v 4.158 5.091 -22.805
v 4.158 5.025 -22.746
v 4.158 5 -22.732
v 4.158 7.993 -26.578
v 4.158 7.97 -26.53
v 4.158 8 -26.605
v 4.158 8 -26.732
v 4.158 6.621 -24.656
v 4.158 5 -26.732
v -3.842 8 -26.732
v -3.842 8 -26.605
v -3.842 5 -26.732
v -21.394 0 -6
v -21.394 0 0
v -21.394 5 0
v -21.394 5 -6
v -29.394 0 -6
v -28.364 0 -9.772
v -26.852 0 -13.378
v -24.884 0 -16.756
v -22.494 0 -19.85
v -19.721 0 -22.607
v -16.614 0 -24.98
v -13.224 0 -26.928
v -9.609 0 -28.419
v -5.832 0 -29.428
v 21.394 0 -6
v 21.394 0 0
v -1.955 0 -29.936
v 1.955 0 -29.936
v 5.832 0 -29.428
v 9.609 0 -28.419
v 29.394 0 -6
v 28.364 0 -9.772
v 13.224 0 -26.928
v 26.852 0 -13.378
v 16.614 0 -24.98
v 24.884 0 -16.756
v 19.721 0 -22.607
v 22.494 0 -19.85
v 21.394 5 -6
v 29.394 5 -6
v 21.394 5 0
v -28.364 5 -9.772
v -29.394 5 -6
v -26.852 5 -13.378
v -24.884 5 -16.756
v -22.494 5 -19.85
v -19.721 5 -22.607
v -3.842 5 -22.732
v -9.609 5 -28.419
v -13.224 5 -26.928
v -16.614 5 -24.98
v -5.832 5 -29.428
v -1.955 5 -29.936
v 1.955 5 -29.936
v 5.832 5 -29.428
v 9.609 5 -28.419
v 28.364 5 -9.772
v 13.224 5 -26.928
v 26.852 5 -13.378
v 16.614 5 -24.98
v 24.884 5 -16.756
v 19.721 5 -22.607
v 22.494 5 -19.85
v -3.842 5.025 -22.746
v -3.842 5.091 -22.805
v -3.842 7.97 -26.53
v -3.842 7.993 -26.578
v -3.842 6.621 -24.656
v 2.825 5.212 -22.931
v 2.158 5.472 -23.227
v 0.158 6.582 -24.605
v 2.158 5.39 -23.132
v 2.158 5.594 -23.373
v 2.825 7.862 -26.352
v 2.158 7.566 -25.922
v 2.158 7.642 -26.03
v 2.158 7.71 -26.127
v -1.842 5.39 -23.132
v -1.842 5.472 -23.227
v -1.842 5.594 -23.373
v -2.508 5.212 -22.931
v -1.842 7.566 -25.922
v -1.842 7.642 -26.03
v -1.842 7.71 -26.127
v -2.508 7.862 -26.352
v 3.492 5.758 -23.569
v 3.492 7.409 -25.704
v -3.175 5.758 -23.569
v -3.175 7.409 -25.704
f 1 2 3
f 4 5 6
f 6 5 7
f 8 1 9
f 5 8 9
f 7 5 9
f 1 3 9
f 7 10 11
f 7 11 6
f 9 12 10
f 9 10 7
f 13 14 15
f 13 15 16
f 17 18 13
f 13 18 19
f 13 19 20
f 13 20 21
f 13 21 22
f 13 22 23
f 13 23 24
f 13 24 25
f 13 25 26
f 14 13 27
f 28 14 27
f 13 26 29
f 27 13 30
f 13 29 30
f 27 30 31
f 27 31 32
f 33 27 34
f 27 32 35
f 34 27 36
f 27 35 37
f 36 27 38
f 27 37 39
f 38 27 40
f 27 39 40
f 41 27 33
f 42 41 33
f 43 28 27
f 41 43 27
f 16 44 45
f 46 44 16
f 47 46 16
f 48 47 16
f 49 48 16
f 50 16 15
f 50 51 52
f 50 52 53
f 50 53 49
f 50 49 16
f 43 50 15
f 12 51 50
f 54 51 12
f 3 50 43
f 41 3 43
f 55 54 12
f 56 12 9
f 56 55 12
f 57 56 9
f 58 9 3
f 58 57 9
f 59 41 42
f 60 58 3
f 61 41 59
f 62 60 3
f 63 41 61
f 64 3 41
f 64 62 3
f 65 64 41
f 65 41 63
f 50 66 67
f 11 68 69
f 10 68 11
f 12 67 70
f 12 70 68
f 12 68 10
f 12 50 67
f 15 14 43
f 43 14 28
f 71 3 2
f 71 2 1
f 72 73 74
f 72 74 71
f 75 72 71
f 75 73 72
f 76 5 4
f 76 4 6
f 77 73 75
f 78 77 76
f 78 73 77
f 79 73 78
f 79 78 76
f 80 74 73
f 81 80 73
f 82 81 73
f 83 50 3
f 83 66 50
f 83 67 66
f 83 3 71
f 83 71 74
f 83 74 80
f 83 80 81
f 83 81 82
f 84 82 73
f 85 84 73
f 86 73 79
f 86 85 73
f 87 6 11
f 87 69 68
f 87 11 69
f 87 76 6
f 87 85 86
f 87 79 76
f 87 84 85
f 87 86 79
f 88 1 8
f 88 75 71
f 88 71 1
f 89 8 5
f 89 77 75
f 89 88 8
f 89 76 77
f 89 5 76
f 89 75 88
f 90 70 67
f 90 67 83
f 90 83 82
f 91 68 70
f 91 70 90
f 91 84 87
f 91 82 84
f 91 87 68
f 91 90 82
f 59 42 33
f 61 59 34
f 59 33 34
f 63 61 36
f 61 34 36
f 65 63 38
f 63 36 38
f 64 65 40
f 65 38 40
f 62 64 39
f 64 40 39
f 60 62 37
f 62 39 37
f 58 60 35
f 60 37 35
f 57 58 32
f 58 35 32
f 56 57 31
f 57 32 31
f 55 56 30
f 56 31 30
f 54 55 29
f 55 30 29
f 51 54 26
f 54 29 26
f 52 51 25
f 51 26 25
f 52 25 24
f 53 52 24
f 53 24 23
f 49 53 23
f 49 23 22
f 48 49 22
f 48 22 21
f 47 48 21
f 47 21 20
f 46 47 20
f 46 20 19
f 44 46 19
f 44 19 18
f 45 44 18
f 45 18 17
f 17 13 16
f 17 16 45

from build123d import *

# Parameters (mm, degrees)
BOSS_EXTRUDE1_DEPTH = 5
SKETCH3_W           = 8
SKETCH3_H           = 4
BOSS_EXTRUDE2_DEPTH = 3
FILLET1_START       = -3.841593316
FILLET1_DEPTH       = 8
CUT_EXTRUDE1_START  = -10
CUT_EXTRUDE1_DEPTH  = 10


with BuildPart() as part:
    # Sketch1 → Boss-Extrude1 (new body)
    with BuildSketch(Plane(origin=(0, 0, 0), x_dir=(1, 0, 0), z_dir=(0, 1, 0))):
        with BuildLine():
            Line((-30, 0), (30, 0))
            ThreePointArc((30, 0), (0, 30), (-30, 0))
        make_face()
    extrude(amount=BOSS_EXTRUDE1_DEPTH)

    # Sketch3 → Boss-Extrude2 (add)
    with BuildSketch(Plane(origin=(0, 5, 0), x_dir=(1, 0, 0), z_dir=(0, 1, 0))):
        with Locations((0.158406684, 24.731666579)):
            Rectangle(SKETCH3_W, SKETCH3_H)
    extrude(amount=BOSS_EXTRUDE2_DEPTH)

    # Fillet1: read off the stored shape, not the designer's step
    # Fillet1 outline → Fillet1 (cut)
    with BuildSketch(Plane.YZ.offset(FILLET1_START)):
        with BuildLine():
            Line((8, -22.731666579), (5, -22.731666579))
            add(Edge.make_bspline(
                [(5, -22.731666579), (8, -23.506263249), (8, -26.604649926)],
                knots=[0, 0, 0, 1, 1, 1], degree=2, weights=[1, 0.057495957, 1]))
            Line((8, -26.604649926), (8, -22.731666579))
        make_face()
    extrude(amount=FILLET1_DEPTH, mode=Mode.SUBTRACT)

    # Sketch5 → Cut-Extrude1 (cut)
    with BuildSketch(Plane(origin=(0, 5, 0), x_dir=(1, 0, 0), z_dir=(0, 1, 0)).offset(CUT_EXTRUDE1_START)):
        with BuildLine():
            Line((-21.393876913, 0), (-21.393876913, 6))
            Line((-21.393876913, 6), (-29.393876913, 6))
            ThreePointArc((-29.393876913, 6), (-29.84808459, 3.01526886), (-30, 0))
            Line((-30, 0), (-21.393876913, 0))
        make_face()
        with BuildLine():
            Line((21.393876913, 6), (29.393876913, 6))
            ThreePointArc((29.393876913, 6), (29.84808459, 3.01526886), (30, 0))
            Line((30, 0), (21.393876913, 0))
            Line((21.393876913, 0), (21.393876913, 6))
        make_face()
    extrude(amount=CUT_EXTRUDE1_DEPTH, mode=Mode.SUBTRACT)


solid = part.part
